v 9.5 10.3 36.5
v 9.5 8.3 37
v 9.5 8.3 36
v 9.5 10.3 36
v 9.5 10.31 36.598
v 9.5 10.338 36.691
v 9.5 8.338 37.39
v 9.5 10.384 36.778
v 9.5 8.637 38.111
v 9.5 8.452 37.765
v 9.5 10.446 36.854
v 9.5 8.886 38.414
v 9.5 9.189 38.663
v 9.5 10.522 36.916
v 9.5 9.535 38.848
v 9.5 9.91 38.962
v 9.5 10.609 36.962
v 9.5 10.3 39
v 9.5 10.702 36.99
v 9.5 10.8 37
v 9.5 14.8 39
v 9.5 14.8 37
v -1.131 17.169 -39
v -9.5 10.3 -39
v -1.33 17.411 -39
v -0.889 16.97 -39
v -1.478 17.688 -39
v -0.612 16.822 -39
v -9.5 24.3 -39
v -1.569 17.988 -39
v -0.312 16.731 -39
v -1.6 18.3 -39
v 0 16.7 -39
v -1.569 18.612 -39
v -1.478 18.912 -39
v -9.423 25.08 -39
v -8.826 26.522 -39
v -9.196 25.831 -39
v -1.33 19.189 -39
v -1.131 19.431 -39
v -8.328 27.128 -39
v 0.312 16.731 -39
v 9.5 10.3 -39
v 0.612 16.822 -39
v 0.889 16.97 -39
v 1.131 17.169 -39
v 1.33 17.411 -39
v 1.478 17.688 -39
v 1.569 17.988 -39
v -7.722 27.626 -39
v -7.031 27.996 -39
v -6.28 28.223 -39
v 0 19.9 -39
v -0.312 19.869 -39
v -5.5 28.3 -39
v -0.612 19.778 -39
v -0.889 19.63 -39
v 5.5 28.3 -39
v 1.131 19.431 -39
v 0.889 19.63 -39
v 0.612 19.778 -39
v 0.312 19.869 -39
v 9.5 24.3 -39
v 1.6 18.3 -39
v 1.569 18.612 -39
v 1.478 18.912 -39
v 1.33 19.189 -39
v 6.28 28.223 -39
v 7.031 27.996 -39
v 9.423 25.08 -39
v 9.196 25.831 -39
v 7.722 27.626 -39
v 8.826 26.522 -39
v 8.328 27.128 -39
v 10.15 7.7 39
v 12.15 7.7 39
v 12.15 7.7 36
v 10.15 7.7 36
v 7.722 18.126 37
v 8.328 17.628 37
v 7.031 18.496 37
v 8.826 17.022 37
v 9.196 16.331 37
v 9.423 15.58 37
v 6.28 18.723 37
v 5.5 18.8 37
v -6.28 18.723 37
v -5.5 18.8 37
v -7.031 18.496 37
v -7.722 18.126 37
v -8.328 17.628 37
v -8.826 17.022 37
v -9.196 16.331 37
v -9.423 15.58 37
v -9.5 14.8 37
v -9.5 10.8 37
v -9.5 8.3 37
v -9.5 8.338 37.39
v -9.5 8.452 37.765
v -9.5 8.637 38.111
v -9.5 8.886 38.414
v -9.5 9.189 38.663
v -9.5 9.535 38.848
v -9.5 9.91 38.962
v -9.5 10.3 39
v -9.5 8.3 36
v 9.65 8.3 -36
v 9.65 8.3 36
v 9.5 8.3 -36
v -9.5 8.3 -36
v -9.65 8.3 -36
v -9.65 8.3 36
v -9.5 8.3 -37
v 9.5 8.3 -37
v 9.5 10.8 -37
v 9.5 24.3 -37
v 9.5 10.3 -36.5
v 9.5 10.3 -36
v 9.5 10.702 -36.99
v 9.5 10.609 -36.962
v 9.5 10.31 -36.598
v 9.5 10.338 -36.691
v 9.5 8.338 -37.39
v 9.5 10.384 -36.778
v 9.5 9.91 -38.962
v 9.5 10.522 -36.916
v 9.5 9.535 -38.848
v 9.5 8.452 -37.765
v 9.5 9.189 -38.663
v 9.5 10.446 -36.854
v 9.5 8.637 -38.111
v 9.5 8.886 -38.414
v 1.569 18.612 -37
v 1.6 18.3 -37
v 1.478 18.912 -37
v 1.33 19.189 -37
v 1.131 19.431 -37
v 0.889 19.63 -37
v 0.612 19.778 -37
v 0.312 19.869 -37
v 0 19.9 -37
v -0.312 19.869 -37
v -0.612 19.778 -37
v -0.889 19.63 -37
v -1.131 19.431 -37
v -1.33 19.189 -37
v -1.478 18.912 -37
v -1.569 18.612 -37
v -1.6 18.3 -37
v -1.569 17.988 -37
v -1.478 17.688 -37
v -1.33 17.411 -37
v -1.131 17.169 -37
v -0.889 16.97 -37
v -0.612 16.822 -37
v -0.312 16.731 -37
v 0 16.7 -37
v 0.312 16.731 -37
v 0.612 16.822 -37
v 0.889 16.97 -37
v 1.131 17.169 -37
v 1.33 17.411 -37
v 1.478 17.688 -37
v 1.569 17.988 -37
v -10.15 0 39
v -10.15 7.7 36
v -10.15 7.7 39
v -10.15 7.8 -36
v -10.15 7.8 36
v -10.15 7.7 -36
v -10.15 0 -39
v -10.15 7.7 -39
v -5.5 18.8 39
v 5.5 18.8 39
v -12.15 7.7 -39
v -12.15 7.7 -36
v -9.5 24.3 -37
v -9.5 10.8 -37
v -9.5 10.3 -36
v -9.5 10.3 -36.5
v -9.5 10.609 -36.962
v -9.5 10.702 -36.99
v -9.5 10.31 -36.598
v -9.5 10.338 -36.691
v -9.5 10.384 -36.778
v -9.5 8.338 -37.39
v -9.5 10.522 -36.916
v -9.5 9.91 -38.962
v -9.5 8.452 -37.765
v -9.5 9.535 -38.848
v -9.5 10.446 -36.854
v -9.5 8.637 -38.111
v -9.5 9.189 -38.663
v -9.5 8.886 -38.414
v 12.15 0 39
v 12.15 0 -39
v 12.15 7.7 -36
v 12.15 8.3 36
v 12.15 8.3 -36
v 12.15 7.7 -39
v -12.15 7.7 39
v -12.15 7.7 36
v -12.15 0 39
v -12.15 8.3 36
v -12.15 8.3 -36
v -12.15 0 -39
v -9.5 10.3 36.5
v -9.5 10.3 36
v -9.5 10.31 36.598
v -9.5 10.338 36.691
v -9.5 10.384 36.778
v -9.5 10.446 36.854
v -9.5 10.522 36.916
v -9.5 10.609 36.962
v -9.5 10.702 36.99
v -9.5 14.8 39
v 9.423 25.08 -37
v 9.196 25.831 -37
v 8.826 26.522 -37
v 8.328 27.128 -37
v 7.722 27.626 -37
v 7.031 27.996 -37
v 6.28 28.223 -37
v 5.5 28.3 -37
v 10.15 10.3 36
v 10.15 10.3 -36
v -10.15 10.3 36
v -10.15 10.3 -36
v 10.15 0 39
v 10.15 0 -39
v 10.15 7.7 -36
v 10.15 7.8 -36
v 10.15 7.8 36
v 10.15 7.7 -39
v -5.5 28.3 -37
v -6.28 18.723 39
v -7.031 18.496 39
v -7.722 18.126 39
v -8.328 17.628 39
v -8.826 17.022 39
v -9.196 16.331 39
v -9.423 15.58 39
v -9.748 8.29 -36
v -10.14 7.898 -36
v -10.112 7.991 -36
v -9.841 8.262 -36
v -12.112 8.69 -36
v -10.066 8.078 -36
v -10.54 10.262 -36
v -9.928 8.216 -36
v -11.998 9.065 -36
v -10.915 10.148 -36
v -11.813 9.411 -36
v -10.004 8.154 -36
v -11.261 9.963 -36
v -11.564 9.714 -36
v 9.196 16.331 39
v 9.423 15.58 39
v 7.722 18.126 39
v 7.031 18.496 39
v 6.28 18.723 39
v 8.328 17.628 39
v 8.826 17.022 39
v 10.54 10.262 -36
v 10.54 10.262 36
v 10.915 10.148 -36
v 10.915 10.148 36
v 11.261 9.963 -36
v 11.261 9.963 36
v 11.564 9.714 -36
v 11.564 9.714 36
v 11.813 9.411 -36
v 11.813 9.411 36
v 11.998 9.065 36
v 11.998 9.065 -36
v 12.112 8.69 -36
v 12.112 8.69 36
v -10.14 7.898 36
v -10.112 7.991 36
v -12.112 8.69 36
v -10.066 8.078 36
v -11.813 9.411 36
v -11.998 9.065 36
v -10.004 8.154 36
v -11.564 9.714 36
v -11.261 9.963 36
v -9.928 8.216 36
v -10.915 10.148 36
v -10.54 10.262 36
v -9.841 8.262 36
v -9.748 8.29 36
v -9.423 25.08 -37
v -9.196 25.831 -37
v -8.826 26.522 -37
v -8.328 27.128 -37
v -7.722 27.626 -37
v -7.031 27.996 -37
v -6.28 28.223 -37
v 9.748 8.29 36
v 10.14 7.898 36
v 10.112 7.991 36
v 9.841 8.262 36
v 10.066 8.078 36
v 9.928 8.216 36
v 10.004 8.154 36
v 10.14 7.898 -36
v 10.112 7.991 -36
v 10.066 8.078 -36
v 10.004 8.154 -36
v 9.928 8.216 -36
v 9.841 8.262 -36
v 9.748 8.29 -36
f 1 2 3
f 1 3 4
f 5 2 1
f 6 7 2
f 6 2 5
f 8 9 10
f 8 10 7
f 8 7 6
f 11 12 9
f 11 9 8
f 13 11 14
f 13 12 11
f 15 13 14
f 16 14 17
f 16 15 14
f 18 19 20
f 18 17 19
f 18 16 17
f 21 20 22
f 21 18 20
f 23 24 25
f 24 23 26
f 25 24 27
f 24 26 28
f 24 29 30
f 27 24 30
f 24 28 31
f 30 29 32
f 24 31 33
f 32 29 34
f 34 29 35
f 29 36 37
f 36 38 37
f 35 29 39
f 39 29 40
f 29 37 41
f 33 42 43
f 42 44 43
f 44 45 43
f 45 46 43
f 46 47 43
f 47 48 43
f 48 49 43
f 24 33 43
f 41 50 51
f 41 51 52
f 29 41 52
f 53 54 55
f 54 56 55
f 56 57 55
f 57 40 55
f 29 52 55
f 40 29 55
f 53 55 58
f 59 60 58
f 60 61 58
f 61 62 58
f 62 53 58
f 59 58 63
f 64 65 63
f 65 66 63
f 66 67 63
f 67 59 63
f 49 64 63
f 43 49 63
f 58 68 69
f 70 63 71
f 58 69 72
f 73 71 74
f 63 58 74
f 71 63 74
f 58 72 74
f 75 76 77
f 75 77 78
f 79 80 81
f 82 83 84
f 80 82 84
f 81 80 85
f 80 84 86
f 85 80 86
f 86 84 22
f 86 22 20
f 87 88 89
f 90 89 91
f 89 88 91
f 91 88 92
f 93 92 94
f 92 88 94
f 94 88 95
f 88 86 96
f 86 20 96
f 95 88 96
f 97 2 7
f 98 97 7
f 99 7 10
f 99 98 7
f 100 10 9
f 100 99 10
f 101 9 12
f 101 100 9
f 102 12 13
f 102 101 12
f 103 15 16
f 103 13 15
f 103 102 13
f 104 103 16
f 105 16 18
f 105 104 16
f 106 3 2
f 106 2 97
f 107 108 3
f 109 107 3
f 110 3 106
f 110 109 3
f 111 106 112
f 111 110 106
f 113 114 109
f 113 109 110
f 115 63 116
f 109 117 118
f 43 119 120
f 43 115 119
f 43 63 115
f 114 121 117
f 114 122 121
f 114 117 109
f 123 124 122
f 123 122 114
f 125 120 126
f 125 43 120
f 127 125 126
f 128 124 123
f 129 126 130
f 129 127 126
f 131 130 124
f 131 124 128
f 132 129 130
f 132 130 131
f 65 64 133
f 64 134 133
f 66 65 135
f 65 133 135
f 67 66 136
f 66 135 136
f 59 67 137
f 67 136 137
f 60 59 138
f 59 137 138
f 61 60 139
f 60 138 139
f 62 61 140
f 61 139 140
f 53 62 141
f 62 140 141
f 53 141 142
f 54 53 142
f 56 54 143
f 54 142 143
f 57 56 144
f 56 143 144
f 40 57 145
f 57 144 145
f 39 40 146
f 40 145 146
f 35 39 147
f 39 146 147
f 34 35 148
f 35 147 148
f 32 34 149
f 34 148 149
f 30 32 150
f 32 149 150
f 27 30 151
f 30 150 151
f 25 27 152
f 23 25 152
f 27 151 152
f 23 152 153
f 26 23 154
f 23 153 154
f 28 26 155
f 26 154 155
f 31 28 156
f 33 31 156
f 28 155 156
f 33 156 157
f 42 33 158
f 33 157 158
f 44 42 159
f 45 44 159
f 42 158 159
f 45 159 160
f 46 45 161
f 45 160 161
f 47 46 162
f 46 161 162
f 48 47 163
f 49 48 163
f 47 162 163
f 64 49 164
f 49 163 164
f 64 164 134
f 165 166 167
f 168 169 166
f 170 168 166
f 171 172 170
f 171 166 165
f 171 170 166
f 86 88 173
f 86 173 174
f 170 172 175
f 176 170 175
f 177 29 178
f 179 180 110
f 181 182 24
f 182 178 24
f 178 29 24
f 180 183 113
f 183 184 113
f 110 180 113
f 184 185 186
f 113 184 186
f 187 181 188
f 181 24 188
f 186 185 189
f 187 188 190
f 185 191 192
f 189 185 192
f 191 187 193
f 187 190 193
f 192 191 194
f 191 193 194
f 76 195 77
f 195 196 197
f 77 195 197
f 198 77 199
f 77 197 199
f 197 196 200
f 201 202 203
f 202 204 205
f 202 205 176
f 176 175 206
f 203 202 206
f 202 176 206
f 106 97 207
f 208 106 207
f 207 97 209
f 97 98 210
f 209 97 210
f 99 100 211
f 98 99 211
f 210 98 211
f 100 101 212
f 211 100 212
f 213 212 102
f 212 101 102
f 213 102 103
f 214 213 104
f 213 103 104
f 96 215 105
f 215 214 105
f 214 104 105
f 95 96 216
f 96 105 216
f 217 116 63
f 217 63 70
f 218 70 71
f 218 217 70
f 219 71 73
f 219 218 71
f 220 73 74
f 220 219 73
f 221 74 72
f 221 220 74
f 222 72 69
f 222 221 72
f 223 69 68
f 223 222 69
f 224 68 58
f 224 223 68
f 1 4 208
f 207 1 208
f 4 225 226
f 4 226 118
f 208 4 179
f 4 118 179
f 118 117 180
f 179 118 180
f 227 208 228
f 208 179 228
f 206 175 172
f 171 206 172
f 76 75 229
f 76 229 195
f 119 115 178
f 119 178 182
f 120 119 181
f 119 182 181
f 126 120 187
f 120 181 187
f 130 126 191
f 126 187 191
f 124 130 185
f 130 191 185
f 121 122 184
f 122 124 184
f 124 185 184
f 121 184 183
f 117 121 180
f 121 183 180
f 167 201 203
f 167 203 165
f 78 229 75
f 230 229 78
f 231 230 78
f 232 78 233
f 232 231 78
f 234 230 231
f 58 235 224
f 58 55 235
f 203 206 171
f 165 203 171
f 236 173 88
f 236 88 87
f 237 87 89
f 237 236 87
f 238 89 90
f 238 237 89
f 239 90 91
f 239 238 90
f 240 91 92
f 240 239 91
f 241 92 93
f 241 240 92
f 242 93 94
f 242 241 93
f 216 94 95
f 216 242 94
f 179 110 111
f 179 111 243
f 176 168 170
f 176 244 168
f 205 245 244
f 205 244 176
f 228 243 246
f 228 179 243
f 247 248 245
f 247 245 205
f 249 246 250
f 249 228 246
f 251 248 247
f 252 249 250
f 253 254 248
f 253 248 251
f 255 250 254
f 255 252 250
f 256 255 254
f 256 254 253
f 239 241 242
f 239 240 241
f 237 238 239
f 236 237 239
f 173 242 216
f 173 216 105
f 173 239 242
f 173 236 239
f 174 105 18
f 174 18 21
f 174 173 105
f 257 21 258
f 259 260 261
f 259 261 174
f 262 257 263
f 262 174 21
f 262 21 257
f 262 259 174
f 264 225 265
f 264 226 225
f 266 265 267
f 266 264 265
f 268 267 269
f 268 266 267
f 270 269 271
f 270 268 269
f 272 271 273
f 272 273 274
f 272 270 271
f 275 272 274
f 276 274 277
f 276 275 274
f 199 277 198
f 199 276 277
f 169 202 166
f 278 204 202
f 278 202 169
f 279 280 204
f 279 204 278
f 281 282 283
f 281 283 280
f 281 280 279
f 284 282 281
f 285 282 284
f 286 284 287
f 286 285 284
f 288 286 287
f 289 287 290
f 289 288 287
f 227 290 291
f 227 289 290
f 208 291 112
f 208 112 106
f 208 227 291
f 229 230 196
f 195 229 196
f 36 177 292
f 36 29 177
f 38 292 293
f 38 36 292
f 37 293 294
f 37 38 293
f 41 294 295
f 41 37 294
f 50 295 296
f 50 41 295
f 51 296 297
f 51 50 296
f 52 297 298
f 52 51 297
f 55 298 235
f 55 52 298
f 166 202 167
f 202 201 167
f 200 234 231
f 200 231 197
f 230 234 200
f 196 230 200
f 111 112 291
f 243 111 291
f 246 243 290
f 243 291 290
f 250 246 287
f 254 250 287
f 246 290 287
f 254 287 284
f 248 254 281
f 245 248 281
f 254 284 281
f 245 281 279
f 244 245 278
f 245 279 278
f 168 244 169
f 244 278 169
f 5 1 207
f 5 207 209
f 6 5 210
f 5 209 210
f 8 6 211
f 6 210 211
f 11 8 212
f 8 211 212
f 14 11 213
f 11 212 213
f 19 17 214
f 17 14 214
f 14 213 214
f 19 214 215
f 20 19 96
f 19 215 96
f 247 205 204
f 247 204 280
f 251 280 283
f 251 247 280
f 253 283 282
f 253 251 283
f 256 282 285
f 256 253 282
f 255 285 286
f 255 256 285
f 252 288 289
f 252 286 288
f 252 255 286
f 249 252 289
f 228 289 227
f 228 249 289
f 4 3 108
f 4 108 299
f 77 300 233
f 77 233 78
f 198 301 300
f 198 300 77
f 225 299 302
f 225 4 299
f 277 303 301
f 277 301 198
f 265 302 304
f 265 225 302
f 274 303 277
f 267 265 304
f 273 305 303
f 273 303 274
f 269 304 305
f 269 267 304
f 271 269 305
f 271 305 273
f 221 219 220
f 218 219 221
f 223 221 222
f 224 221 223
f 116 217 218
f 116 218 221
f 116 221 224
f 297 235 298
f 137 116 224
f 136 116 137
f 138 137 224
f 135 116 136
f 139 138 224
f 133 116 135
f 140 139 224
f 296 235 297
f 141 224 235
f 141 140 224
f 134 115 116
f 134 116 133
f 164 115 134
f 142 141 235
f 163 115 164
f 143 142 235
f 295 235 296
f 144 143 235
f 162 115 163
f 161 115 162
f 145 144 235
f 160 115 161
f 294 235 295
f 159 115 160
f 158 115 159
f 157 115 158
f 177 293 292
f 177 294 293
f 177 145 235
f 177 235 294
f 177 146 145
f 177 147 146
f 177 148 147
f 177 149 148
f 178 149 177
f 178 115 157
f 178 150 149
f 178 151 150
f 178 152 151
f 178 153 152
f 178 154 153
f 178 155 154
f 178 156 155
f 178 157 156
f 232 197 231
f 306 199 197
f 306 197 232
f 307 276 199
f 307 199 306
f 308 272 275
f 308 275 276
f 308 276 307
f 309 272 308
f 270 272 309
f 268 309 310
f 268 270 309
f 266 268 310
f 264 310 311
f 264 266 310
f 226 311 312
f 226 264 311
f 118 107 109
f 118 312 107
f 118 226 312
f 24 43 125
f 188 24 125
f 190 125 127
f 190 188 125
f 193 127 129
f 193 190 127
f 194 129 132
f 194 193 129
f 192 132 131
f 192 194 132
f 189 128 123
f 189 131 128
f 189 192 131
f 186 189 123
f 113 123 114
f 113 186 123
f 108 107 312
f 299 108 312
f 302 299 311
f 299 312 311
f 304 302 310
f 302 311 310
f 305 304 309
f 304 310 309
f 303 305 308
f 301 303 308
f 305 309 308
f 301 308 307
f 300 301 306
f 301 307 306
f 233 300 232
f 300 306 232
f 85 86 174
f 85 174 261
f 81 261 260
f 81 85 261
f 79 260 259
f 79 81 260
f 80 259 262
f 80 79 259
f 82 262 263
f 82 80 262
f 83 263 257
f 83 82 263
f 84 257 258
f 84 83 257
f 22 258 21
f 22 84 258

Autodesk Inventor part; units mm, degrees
ref_plane "YZ Plane" through (0, 0, 0) normal (1, 0, 0) x (0, 1, 0)
ref_plane "XZ Plane" through (0, 0, 0) normal (0, 1, 0) x (-1, 0, 0)
ref_plane "XY Plane" through (0, 0, 0) normal (0, 0, 1) x (1, 0, 0)
sketch "Эскиз1" plane through (0, 0, 0) normal (0, 0, 1) x (1, 0, 0)
  line L0 (0, 0) -> (0, 11.2754) construction
  line L1 (0, 0) -> (-17.0842, 0) construction
  line L2 (-12.15, 0) -> (12.15, 0)
  line L3 (12.15, 0) -> (12.15, 10.3)
  line L4 (12.15, 10.3) -> (-12.15, 10.3)
  line L5 (-12.15, 10.3) -> (-12.15, 0)
  line L6 (-10.15, 0) -> (10.15, 0)
  line L7 (10.15, 0) -> (10.15, 8.3)
  line L8 (10.15, 8.3) -> (-10.15, 8.3)
  line L9 (-10.15, 8.3) -> (-10.15, 0)
  dimension "d0" = 2
  dimension "d1" = 2
  dimension "d2" = 2
  dimension "d3" = 24.3
  dimension "d4" = 10.3
extrude "Выдавливание1" add sketch "Эскиз1" along normal mid plane 78 contours L5 L4 L3 L2 L7 L8 L9
sketch "Эскиз2" plane through (-12.15, 10.3, -39) normal (0, 1, 0) x (1, 0, 0)
  line L0 (0, 0) -> (24.3, 0) projected
  line L1 (2.65, 0) -> (21.65, 0)
  line L2 (21.65, 0) -> (21.65, -2)
  line L3 (21.65, -2) -> (2.65, -2)
  line L4 (2.65, -2) -> (2.65, 0)
  line L5 (24.3, -78) -> (0, -78) projected
  line L6 (2.65, -78) -> (21.65, -78)
  line L7 (21.65, -78) -> (21.65, -76)
  line L8 (21.65, -76) -> (2.65, -76)
  line L9 (2.65, -76) -> (2.65, -78)
  line L10 (12.15, -39) -> (12.15, -67.9082) construction
  dimension "d7" = 2
  dimension "d8" = 2
  dimension "d9" = 19
  dimension "d10" = 19
extrude "Выдавливание2" add sketch "Эскиз2" along normal blind 8.5 contours L5 L9 L8 L7
extrude "Выдавливание3" add sketch "Эскиз2" along normal blind 18 contours L0 L2 L3 L4
fillet "Сопряжение1" radius 4 4 edges at (9.5, 28.3, -38) (-9.5, 28.3, -38) (-9.5, 18.8, 38) (9.5, 18.8, 38)
sketch "Эскиз3" plane through (-9.5, 10.3, -37) normal (0, 0, 1) x (1, 0, 0)
  line L0 (9.5, -10.3) -> (9.5, 21.9843) construction
  circle A0 centre (9.5, 8) radius 1.6
  line L1 (15, 18) -> (4, 18) projected
  dimension "d16" = 3.2
  dimension "d17" = 10
extrude "Выдавливание4" cut sketch "Эскиз3" against normal blind 18
sketch "Эскиз4" plane through (0, 0, 39) normal (0, 0, 1) x (1, 0, 0)
  line L0 (12.15, 0) -> (12.15, 10.3) projected
  line L1 (9.5, 10.3) -> (12.15, 10.3)
  line L2 (12.15, 10.3) -> (12.15, 7.7)
  line L3 (12.15, 7.7) -> (9.5, 7.7)
  line L4 (9.5, 7.7) -> (9.5, 10.3)
  line L5 (10.15, 0) -> (12.15, 0) projected
  line L6 (-12.15, 10.3) -> (-9.5, 10.3) projected
  line L7 (-9.5, 10.3) -> (-15.4416, 10.3)
  line L8 (-15.4416, 10.3) -> (-15.4416, 7.7)
  line L9 (-15.4416, 7.7) -> (-9.5, 7.7)
  line L10 (-9.5, 7.7) -> (-9.5, 10.3)
  line L11 (-12.15, 0) -> (-10.15, 0) projected
  point P0 (0, 0)
  dimension "d20" = 7.7
  dimension "d21" = 7.7
extrude "Выдавливание5" cut sketch "Эскиз4" against normal blind 3
mirror "Зеркальное отражение1" about plane through (0, 0, 0) normal (0, 0, 1) of "Выдавливание5"
fillet "Сопряжение2" radius 2 4 edges at (0, 8.3, 39) (12.15, 10.3, 0) (-12.15, 10.3, 0) (0, 8.3, -39)
fillet "Сопряжение3" radius 0.5 4 edges at (0, 10.3, -37) (0, 10.3, 37) (10.15, 8.3, 0) (-10.15, 8.3, 0)
properties part number "крепление бабины"
